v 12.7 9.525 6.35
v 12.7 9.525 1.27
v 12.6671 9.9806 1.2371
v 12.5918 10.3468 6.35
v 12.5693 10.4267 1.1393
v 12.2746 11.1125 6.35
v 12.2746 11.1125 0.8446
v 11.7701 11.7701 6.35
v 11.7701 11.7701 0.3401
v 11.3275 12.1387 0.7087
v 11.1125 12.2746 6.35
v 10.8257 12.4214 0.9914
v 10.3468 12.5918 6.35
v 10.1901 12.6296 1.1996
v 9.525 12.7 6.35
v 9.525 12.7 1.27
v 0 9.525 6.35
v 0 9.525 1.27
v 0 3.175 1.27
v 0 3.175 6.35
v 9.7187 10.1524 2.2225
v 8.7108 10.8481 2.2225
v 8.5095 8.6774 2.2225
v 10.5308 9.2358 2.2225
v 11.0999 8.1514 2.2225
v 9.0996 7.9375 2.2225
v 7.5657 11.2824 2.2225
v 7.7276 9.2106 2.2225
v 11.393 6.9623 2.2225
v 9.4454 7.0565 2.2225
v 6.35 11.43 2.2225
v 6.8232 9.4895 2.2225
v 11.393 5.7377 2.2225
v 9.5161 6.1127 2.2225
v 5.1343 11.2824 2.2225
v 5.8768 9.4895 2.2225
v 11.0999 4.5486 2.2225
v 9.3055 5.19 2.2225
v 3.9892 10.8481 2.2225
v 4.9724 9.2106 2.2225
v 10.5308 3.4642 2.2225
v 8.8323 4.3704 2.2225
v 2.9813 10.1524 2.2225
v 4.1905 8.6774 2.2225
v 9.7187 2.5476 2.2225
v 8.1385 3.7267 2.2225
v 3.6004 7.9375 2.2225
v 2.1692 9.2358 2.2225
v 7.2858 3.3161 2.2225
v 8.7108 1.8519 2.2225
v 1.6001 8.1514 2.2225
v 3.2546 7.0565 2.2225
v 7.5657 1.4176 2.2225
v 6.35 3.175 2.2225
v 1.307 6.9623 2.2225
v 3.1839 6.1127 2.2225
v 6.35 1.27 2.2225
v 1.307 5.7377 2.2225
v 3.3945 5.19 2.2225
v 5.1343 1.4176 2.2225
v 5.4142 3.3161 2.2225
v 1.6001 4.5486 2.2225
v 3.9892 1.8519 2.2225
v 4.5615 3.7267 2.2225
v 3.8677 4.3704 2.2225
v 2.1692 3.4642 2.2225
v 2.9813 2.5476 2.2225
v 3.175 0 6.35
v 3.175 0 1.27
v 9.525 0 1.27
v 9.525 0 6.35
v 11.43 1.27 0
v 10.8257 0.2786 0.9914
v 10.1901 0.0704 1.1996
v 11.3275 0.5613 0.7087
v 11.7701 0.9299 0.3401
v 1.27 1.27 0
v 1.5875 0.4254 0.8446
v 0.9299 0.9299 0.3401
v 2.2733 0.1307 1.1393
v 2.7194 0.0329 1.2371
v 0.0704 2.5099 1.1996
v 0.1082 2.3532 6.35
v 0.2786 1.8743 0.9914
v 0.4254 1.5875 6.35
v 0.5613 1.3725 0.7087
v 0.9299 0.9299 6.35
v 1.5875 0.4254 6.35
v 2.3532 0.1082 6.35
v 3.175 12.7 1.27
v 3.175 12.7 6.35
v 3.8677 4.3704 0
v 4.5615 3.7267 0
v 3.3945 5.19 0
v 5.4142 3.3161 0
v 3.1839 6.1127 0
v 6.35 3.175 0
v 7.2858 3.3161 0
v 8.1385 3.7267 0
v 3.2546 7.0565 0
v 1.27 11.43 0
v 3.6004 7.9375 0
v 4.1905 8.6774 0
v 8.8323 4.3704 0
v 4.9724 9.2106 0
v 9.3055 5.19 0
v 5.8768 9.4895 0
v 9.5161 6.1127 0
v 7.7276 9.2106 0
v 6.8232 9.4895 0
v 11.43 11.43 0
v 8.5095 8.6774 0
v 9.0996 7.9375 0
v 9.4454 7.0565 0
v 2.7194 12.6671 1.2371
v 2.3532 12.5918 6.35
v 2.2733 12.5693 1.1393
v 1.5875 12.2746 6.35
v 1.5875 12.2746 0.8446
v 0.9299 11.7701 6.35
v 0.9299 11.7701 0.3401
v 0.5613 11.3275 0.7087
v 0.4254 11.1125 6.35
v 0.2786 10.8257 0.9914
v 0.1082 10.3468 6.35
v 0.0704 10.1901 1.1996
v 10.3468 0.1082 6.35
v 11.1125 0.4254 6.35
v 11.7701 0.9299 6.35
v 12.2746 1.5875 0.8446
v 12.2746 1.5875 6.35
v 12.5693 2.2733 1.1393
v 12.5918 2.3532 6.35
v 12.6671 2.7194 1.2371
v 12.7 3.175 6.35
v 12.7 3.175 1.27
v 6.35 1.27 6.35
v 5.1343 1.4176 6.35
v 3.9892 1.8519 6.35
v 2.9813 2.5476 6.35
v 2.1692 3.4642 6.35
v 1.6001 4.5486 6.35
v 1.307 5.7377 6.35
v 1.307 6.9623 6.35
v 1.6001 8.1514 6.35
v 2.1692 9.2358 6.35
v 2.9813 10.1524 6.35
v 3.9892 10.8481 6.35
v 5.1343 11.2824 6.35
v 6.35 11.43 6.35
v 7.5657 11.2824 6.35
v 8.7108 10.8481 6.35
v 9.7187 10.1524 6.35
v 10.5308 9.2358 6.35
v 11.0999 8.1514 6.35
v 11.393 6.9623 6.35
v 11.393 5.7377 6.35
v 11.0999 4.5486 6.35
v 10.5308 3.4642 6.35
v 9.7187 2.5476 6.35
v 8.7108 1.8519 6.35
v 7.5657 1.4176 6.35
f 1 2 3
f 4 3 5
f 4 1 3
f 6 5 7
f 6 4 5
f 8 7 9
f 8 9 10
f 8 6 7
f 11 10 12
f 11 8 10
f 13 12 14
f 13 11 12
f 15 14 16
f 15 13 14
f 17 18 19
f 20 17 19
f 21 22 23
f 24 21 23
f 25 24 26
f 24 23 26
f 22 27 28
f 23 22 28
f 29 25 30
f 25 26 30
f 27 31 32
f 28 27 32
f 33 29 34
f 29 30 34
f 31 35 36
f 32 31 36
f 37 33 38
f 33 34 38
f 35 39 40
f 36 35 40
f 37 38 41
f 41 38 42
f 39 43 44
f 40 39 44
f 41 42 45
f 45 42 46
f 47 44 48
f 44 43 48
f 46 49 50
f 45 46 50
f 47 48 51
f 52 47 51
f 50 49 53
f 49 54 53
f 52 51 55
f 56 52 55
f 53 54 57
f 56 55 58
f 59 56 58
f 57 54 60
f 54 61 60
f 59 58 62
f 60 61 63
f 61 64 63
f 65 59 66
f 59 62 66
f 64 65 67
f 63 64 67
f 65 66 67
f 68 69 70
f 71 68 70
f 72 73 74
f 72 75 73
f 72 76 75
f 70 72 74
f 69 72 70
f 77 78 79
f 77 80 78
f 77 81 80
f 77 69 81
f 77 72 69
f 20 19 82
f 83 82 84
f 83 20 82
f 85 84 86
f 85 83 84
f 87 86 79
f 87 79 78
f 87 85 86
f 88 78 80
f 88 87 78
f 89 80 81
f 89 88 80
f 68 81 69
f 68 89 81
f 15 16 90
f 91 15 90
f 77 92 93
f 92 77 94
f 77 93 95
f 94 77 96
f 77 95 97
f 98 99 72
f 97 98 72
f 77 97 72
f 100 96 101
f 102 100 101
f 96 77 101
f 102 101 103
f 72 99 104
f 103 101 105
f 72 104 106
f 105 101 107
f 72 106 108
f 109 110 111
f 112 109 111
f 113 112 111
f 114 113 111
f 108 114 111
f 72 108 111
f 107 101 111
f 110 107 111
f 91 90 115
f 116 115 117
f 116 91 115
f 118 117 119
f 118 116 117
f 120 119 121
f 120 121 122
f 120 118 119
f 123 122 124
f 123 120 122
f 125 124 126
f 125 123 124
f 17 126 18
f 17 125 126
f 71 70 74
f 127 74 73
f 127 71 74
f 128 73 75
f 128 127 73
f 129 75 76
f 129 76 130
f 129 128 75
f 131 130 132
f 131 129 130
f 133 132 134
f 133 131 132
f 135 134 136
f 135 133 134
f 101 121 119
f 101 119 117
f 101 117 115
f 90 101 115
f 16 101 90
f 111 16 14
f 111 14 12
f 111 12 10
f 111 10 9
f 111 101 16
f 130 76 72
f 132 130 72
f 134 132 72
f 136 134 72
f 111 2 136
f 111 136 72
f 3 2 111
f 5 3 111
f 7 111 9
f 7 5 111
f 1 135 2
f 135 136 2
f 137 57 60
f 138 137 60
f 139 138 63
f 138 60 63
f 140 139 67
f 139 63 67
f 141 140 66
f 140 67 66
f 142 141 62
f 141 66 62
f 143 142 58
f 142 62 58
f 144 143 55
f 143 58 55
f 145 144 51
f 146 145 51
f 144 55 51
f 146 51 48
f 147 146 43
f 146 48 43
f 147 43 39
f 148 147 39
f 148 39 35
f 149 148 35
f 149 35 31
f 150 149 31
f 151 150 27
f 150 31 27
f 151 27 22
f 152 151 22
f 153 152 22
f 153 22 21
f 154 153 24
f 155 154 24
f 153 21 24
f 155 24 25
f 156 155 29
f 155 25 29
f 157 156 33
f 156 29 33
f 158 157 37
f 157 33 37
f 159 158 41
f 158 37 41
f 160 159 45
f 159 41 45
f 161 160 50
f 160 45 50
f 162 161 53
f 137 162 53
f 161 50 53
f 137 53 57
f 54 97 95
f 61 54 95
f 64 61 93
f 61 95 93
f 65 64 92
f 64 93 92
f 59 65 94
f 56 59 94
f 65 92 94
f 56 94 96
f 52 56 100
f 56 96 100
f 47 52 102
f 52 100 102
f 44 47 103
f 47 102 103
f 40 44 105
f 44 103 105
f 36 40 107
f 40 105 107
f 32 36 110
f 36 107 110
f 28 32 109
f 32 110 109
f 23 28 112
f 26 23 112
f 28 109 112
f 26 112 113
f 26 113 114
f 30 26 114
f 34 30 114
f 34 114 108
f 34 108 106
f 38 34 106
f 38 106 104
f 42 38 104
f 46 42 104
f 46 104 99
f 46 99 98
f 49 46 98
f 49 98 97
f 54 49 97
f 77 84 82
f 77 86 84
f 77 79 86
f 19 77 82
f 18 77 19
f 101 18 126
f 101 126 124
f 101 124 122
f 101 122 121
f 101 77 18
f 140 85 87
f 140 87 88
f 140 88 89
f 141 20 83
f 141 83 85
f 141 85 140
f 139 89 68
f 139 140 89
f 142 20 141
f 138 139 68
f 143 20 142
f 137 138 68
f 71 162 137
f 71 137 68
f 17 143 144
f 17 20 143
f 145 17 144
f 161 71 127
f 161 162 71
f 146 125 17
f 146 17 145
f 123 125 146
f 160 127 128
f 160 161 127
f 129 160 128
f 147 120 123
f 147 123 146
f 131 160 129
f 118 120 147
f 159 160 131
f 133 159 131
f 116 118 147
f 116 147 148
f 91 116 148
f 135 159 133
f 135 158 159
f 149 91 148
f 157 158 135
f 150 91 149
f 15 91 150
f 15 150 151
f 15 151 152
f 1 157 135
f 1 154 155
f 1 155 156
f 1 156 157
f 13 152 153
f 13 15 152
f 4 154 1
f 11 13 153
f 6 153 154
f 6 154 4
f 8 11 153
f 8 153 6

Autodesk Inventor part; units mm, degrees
ref_plane "YZ Plane" through (0, 0, 0) normal (1, 0, 0) x (0, 1, 0)
ref_plane "XZ Plane" through (0, 0, 0) normal (0, 1, 0) x (-1, 0, 0)
ref_plane "XY Plane" through (0, 0, 0) normal (0, 0, 1) x (1, 0, 0)
sketch "Sketch1" plane through (0, 0, 0) normal (0, 0, 1) x (1, 0, 0)
  line L0 (0, 0) -> (12.7, 0)
  line L1 (12.7, 0) -> (12.7, 12.7)
  line L2 (12.7, 12.7) -> (0, 12.7)
  line L3 (0, 12.7) -> (0, 0)
  dimension "d0" = 12.7
  dimension "d1" = 12.7
extrude "Extrusion1" add sketch "Sketch1" along normal blind 6.35
sketch "Sketch2" plane through (0, 0, 6.35) normal (0, 0, 1) x (1, 0, 0)
  line L0 (0, 12.7) -> (0, 0) construction
  line L1 (0, 0) -> (12.7, 0) construction
  line L2 (0, 12.7) -> (12.7, 0) construction
  line L3 (12.7, 12.7) -> (0, 12.7) construction
  line L4 (0, 0) -> (12.7, 12.7) construction
  point P0 (6.35, 6.35)
hole "Hole1" at (6.35, 6.35, 6.35) direction (0, 0, -1) diameter 6.35 end through all counterbore diameter 10.16 counterbore depth 4.1275
chamfer "Chamfer1" distance 1.27 angle 45 4 edges at (12.7, 6.35, 0) (6.35, 12.7, 0) (0, 6.35, 0) (6.35, 0, 0)
fillet "Fillet1" radius 3.175 4 edges at (12.7, 12.7, 3.81) (12.7, 0, 3.81) (0, 12.7, 3.81) (0, 0, 3.81)
properties part number "testswitch"
